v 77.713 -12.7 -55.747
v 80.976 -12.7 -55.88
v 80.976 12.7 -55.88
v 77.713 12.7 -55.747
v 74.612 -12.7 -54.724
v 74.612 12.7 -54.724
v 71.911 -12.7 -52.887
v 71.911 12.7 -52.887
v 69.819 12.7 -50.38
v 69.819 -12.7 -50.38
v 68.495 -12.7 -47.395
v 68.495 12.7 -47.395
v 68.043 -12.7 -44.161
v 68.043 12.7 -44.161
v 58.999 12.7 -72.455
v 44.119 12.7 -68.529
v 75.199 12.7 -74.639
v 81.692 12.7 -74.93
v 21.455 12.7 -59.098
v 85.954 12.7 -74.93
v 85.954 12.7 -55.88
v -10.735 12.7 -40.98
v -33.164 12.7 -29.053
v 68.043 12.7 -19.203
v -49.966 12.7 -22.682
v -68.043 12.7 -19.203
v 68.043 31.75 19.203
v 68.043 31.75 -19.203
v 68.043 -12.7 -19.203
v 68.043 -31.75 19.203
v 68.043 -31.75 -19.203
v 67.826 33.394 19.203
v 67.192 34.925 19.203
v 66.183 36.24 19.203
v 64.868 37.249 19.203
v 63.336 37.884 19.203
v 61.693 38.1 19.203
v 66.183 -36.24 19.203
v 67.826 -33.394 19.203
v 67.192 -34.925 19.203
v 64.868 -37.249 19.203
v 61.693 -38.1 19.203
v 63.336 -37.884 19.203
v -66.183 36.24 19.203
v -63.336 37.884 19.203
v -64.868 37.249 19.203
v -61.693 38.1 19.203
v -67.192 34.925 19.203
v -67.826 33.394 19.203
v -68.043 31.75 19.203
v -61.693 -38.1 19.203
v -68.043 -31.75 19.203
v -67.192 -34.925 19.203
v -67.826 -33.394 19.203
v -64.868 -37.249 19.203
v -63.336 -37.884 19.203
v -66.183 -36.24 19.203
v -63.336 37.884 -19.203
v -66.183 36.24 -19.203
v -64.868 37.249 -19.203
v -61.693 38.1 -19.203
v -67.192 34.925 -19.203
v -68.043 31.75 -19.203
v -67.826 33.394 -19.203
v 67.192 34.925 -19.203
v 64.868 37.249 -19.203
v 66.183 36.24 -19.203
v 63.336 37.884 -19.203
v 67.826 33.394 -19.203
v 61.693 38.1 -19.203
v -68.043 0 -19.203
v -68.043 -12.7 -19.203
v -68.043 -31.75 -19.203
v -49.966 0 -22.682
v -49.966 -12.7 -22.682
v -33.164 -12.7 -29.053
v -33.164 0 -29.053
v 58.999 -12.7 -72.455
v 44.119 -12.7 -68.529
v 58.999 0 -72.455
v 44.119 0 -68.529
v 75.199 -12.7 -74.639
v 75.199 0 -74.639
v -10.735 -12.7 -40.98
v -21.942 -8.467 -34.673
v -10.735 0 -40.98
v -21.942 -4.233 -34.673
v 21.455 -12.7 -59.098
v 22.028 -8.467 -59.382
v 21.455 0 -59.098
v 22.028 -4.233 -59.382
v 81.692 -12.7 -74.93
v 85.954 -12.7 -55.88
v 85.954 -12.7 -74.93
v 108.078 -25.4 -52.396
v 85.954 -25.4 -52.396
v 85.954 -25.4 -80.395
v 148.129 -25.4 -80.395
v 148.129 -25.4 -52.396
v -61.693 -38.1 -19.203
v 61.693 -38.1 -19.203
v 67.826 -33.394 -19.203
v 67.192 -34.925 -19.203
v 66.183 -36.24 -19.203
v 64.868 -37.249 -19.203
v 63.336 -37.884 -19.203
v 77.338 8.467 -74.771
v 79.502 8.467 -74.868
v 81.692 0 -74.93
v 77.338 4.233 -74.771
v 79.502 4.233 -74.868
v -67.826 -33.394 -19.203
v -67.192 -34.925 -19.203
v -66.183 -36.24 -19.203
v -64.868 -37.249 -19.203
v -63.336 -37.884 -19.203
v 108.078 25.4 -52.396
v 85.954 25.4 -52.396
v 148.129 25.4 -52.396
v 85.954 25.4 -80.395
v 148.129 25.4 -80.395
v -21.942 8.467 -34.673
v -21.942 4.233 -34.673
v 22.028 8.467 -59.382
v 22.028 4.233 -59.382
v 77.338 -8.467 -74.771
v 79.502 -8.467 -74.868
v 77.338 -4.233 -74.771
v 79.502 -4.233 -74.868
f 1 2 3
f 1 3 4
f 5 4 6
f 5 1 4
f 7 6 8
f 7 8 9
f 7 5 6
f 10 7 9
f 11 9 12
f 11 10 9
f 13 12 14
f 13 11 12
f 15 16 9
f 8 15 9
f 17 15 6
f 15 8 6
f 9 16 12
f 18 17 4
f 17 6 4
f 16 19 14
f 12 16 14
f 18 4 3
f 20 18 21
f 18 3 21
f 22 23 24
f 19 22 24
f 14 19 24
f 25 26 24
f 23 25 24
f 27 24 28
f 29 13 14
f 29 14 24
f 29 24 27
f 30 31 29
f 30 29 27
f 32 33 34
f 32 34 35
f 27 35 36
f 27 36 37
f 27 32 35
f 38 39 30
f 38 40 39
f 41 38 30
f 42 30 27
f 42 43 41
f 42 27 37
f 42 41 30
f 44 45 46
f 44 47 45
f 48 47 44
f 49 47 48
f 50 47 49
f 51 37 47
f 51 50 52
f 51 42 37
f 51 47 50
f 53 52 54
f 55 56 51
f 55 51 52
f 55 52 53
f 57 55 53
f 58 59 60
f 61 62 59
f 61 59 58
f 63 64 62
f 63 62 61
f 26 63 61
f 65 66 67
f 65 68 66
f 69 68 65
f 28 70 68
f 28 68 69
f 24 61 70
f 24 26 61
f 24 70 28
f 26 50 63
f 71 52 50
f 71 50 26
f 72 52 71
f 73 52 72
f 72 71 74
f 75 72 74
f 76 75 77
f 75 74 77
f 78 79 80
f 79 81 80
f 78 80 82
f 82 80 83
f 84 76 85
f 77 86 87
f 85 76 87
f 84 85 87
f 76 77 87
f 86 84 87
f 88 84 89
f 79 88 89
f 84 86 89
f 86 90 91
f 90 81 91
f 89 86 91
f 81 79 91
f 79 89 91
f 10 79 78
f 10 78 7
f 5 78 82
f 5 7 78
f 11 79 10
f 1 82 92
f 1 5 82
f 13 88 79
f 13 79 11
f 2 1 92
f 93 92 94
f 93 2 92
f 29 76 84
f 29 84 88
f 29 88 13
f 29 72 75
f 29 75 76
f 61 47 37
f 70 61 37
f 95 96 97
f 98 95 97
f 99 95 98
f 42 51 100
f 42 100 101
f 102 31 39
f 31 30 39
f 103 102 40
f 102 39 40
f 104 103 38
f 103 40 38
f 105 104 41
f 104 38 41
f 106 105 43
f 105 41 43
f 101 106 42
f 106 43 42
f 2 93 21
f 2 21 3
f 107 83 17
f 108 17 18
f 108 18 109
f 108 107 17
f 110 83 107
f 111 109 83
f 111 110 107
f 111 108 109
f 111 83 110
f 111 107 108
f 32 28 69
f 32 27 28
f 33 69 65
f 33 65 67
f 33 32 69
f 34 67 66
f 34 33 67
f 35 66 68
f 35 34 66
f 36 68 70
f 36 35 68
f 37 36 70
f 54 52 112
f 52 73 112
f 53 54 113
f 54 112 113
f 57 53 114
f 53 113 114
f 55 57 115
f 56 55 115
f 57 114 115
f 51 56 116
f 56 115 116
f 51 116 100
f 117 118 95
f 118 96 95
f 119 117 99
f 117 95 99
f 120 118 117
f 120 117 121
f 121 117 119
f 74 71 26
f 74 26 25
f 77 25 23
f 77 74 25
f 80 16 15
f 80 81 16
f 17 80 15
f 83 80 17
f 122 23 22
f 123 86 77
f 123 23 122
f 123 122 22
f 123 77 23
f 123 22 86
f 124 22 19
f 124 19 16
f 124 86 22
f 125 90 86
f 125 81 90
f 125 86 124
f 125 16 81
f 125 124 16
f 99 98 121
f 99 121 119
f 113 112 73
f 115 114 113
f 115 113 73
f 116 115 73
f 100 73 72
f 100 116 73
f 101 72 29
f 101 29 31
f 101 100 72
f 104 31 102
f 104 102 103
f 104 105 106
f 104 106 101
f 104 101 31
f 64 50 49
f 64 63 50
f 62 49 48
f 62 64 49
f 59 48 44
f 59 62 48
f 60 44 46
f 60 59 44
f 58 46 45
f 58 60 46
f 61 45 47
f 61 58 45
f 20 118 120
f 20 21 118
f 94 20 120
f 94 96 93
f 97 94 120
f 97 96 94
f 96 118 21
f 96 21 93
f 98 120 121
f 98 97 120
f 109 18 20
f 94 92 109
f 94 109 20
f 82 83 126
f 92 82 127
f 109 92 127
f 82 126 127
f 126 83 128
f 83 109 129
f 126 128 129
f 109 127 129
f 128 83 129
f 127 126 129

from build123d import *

# Parameters (mm, degrees)
F1_DEPTH = 38.1
F2_DEPTH = 12.7
F0_W     = 22.1240029774
F0_H     = 19.05
F0_H_2   = 5.4648819111
F0_H_3   = 3.4845191814
F3_DEPTH = 25.4
F4_R     = 6.35


with BuildPart() as f1:
    # F0 (on Front) → F1 (new body, symmetric)
    with BuildSketch(Plane.XZ):
        Polygon((48.99266572, -19.2026612566), (68.04266572, -19.2026612566), (68.04266572, 19.2026612566), (-68.04266572, 19.2026612566), (-68.04266572, -19.2026612566), align=None)
    extrude(amount=F1_DEPTH, both=True)

    # F0 (on Front) → F2 (join, symmetric)
    with BuildSketch(Plane.XZ):
        with BuildLine():
            Line((48.99266572, -44.1608317196), (48.99266572, -19.2026612566))
            Line((48.99266572, -19.2026612566), (-68.04266572, -19.2026612566))
            add(Edge.make_bspline(
                [(-68.04266572, -19.2026612566), (-17.0981840349, -23.8250708772), (13.6489767473, -70.337126404), (75.1989668614, -74.6391754041)],
                knots=[0, 0, 0, 0, 154.432294088, 154.432294088, 154.432294088, 154.432294088], degree=3))
            ThreePointArc((75.1989668614, -74.6391754041), (56.4450578335, -64.258715024), (48.99266572, -44.1608317196))
        make_face()
        with BuildLine():
            Line((68.04266572, -44.1608317196), (68.04266572, -19.2026612566))
            Line((68.04266572, -19.2026612566), (48.99266572, -19.2026612566))
            Line((48.99266572, -19.2026612566), (48.99266572, -44.1608317196))
            ThreePointArc((48.99266572, -44.1608317196), (56.4450578335, -64.258715024), (75.1989668614, -74.6391754041))
            add(Edge.make_bspline(
                [(75.1989668614, -74.6391754041), (77.3256902061, -74.7878231622), (79.4891888852, -74.8860766175), (81.6915667764, -74.930466459)],
                knots=[154.432294088, 154.432294088, 154.432294088, 154.432294088, 159.7683593643, 159.7683593643, 159.7683593643, 159.7683593643], degree=3))
            Line((81.6915667764, -74.930466459), (85.9540551901, -74.930466459))
            Line((85.9540551901, -74.930466459), (85.9540551901, -55.880466459))
            Line((85.9540551901, -55.880466459), (80.9756178971, -55.880466459))
            ThreePointArc((80.9756178971, -55.880466459), (71.9113494041, -52.8873873179), (68.04266572, -44.1608317196))
        make_face()
    extrude(amount=F2_DEPTH, both=True)

    # F0 (on Front) → F3 (join, symmetric)
    with BuildSketch(Plane.XZ):
        Polygon((108.0780581675, -52.3959472775), (108.0780581675, -55.880466459), (108.0780581675, -74.930466459), (108.0780581675, -80.3953483701), (148.1291949749, -80.3953483701), (148.1291949749, -52.3959472775), align=None)
        with Locations((97.0160566788, -65.405466459)):
            Rectangle(F0_W, F0_H)
        with Locations((97.0160566788, -77.6629074145)):
            Rectangle(F0_W, F0_H_2)
        with Locations((97.0160566788, -54.1382068683)):
            Rectangle(F0_W, F0_H_3)
    extrude(amount=F3_DEPTH, both=True)

    # F4
    f4_edges = [f1.edges().sort_by_distance(p)[0] for p in [
        (68.042666, -38.1, 0),
        (-68.042666, -38.1, 0),
        (-68.042666, 38.1, 0),
        (68.042666, 38.1, 0),
    ]]
    fillet(f4_edges, radius=F4_R)


solid = f1.part
